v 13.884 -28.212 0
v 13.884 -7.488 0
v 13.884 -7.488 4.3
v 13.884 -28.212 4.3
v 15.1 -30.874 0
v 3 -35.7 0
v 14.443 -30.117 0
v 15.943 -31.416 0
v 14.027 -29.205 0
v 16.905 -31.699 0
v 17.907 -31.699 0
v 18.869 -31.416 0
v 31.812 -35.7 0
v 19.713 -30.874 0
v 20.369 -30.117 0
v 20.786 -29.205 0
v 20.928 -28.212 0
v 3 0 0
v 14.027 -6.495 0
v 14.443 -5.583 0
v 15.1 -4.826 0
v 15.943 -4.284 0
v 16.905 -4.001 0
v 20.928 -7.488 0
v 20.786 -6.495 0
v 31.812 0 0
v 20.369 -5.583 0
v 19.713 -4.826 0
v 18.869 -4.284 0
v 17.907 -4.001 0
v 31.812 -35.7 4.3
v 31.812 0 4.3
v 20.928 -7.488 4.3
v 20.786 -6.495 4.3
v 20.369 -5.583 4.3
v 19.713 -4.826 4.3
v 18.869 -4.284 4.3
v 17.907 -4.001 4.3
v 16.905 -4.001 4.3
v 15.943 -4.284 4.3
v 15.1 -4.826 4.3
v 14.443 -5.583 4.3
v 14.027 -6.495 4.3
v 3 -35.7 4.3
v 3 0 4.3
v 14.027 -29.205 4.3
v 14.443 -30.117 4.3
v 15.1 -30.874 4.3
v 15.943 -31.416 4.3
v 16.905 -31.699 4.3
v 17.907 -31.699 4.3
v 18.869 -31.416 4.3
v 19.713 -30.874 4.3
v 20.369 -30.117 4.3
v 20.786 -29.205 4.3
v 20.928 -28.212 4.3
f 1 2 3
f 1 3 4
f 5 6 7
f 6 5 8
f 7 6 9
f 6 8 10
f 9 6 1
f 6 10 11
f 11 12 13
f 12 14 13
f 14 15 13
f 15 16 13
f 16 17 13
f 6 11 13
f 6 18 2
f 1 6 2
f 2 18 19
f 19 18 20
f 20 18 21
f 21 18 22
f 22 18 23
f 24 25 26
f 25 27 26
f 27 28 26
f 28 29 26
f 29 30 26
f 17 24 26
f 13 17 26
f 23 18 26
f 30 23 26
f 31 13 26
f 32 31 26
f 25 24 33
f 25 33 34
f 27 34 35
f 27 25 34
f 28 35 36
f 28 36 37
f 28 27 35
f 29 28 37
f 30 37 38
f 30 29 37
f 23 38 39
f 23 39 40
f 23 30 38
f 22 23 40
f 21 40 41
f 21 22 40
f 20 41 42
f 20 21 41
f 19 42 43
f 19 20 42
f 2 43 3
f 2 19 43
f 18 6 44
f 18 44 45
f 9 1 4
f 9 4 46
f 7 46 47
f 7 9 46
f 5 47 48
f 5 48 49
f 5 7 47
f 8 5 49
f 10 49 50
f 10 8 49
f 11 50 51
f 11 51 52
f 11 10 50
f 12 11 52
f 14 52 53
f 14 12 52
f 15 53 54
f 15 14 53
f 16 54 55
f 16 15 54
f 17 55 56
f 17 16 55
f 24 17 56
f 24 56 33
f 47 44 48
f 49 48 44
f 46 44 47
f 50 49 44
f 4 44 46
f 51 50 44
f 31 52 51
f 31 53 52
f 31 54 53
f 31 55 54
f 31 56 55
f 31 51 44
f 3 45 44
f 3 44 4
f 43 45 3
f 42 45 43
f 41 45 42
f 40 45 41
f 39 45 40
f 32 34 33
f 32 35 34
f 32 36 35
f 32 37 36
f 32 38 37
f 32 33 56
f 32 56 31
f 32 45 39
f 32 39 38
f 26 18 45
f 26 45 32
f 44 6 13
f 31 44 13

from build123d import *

# Parameters (mm, degrees)
SKETCH_1_W      = 28.812419505
SKETCH_1_H      = 35.7
EXTRUDE_1_DEPTH = 4.3


with BuildPart() as part:
    # 草图1 → 凸台-拉伸1 (new body)
    with BuildSketch(Plane.XY):
        with Locations((17.406209753, -17.85)):
            Rectangle(SKETCH_1_W, SKETCH_1_H)
        with BuildLine():
            ThreePointArc((13.884047379, -28.212407831), (17.406209752, -31.734570205), (20.928372126, -28.212407831))
            Line((20.928372126, -28.212407831), (20.928372126, -7.487592169))
            ThreePointArc((20.928372126, -7.487592169), (17.406209752, -3.965429795), (13.884047379, -7.487592169))
            Line((13.884047379, -7.487592169), (13.884047379, -28.212407831))
        make_face(mode=Mode.SUBTRACT)
    extrude(amount=EXTRUDE_1_DEPTH)


solid = part.part
